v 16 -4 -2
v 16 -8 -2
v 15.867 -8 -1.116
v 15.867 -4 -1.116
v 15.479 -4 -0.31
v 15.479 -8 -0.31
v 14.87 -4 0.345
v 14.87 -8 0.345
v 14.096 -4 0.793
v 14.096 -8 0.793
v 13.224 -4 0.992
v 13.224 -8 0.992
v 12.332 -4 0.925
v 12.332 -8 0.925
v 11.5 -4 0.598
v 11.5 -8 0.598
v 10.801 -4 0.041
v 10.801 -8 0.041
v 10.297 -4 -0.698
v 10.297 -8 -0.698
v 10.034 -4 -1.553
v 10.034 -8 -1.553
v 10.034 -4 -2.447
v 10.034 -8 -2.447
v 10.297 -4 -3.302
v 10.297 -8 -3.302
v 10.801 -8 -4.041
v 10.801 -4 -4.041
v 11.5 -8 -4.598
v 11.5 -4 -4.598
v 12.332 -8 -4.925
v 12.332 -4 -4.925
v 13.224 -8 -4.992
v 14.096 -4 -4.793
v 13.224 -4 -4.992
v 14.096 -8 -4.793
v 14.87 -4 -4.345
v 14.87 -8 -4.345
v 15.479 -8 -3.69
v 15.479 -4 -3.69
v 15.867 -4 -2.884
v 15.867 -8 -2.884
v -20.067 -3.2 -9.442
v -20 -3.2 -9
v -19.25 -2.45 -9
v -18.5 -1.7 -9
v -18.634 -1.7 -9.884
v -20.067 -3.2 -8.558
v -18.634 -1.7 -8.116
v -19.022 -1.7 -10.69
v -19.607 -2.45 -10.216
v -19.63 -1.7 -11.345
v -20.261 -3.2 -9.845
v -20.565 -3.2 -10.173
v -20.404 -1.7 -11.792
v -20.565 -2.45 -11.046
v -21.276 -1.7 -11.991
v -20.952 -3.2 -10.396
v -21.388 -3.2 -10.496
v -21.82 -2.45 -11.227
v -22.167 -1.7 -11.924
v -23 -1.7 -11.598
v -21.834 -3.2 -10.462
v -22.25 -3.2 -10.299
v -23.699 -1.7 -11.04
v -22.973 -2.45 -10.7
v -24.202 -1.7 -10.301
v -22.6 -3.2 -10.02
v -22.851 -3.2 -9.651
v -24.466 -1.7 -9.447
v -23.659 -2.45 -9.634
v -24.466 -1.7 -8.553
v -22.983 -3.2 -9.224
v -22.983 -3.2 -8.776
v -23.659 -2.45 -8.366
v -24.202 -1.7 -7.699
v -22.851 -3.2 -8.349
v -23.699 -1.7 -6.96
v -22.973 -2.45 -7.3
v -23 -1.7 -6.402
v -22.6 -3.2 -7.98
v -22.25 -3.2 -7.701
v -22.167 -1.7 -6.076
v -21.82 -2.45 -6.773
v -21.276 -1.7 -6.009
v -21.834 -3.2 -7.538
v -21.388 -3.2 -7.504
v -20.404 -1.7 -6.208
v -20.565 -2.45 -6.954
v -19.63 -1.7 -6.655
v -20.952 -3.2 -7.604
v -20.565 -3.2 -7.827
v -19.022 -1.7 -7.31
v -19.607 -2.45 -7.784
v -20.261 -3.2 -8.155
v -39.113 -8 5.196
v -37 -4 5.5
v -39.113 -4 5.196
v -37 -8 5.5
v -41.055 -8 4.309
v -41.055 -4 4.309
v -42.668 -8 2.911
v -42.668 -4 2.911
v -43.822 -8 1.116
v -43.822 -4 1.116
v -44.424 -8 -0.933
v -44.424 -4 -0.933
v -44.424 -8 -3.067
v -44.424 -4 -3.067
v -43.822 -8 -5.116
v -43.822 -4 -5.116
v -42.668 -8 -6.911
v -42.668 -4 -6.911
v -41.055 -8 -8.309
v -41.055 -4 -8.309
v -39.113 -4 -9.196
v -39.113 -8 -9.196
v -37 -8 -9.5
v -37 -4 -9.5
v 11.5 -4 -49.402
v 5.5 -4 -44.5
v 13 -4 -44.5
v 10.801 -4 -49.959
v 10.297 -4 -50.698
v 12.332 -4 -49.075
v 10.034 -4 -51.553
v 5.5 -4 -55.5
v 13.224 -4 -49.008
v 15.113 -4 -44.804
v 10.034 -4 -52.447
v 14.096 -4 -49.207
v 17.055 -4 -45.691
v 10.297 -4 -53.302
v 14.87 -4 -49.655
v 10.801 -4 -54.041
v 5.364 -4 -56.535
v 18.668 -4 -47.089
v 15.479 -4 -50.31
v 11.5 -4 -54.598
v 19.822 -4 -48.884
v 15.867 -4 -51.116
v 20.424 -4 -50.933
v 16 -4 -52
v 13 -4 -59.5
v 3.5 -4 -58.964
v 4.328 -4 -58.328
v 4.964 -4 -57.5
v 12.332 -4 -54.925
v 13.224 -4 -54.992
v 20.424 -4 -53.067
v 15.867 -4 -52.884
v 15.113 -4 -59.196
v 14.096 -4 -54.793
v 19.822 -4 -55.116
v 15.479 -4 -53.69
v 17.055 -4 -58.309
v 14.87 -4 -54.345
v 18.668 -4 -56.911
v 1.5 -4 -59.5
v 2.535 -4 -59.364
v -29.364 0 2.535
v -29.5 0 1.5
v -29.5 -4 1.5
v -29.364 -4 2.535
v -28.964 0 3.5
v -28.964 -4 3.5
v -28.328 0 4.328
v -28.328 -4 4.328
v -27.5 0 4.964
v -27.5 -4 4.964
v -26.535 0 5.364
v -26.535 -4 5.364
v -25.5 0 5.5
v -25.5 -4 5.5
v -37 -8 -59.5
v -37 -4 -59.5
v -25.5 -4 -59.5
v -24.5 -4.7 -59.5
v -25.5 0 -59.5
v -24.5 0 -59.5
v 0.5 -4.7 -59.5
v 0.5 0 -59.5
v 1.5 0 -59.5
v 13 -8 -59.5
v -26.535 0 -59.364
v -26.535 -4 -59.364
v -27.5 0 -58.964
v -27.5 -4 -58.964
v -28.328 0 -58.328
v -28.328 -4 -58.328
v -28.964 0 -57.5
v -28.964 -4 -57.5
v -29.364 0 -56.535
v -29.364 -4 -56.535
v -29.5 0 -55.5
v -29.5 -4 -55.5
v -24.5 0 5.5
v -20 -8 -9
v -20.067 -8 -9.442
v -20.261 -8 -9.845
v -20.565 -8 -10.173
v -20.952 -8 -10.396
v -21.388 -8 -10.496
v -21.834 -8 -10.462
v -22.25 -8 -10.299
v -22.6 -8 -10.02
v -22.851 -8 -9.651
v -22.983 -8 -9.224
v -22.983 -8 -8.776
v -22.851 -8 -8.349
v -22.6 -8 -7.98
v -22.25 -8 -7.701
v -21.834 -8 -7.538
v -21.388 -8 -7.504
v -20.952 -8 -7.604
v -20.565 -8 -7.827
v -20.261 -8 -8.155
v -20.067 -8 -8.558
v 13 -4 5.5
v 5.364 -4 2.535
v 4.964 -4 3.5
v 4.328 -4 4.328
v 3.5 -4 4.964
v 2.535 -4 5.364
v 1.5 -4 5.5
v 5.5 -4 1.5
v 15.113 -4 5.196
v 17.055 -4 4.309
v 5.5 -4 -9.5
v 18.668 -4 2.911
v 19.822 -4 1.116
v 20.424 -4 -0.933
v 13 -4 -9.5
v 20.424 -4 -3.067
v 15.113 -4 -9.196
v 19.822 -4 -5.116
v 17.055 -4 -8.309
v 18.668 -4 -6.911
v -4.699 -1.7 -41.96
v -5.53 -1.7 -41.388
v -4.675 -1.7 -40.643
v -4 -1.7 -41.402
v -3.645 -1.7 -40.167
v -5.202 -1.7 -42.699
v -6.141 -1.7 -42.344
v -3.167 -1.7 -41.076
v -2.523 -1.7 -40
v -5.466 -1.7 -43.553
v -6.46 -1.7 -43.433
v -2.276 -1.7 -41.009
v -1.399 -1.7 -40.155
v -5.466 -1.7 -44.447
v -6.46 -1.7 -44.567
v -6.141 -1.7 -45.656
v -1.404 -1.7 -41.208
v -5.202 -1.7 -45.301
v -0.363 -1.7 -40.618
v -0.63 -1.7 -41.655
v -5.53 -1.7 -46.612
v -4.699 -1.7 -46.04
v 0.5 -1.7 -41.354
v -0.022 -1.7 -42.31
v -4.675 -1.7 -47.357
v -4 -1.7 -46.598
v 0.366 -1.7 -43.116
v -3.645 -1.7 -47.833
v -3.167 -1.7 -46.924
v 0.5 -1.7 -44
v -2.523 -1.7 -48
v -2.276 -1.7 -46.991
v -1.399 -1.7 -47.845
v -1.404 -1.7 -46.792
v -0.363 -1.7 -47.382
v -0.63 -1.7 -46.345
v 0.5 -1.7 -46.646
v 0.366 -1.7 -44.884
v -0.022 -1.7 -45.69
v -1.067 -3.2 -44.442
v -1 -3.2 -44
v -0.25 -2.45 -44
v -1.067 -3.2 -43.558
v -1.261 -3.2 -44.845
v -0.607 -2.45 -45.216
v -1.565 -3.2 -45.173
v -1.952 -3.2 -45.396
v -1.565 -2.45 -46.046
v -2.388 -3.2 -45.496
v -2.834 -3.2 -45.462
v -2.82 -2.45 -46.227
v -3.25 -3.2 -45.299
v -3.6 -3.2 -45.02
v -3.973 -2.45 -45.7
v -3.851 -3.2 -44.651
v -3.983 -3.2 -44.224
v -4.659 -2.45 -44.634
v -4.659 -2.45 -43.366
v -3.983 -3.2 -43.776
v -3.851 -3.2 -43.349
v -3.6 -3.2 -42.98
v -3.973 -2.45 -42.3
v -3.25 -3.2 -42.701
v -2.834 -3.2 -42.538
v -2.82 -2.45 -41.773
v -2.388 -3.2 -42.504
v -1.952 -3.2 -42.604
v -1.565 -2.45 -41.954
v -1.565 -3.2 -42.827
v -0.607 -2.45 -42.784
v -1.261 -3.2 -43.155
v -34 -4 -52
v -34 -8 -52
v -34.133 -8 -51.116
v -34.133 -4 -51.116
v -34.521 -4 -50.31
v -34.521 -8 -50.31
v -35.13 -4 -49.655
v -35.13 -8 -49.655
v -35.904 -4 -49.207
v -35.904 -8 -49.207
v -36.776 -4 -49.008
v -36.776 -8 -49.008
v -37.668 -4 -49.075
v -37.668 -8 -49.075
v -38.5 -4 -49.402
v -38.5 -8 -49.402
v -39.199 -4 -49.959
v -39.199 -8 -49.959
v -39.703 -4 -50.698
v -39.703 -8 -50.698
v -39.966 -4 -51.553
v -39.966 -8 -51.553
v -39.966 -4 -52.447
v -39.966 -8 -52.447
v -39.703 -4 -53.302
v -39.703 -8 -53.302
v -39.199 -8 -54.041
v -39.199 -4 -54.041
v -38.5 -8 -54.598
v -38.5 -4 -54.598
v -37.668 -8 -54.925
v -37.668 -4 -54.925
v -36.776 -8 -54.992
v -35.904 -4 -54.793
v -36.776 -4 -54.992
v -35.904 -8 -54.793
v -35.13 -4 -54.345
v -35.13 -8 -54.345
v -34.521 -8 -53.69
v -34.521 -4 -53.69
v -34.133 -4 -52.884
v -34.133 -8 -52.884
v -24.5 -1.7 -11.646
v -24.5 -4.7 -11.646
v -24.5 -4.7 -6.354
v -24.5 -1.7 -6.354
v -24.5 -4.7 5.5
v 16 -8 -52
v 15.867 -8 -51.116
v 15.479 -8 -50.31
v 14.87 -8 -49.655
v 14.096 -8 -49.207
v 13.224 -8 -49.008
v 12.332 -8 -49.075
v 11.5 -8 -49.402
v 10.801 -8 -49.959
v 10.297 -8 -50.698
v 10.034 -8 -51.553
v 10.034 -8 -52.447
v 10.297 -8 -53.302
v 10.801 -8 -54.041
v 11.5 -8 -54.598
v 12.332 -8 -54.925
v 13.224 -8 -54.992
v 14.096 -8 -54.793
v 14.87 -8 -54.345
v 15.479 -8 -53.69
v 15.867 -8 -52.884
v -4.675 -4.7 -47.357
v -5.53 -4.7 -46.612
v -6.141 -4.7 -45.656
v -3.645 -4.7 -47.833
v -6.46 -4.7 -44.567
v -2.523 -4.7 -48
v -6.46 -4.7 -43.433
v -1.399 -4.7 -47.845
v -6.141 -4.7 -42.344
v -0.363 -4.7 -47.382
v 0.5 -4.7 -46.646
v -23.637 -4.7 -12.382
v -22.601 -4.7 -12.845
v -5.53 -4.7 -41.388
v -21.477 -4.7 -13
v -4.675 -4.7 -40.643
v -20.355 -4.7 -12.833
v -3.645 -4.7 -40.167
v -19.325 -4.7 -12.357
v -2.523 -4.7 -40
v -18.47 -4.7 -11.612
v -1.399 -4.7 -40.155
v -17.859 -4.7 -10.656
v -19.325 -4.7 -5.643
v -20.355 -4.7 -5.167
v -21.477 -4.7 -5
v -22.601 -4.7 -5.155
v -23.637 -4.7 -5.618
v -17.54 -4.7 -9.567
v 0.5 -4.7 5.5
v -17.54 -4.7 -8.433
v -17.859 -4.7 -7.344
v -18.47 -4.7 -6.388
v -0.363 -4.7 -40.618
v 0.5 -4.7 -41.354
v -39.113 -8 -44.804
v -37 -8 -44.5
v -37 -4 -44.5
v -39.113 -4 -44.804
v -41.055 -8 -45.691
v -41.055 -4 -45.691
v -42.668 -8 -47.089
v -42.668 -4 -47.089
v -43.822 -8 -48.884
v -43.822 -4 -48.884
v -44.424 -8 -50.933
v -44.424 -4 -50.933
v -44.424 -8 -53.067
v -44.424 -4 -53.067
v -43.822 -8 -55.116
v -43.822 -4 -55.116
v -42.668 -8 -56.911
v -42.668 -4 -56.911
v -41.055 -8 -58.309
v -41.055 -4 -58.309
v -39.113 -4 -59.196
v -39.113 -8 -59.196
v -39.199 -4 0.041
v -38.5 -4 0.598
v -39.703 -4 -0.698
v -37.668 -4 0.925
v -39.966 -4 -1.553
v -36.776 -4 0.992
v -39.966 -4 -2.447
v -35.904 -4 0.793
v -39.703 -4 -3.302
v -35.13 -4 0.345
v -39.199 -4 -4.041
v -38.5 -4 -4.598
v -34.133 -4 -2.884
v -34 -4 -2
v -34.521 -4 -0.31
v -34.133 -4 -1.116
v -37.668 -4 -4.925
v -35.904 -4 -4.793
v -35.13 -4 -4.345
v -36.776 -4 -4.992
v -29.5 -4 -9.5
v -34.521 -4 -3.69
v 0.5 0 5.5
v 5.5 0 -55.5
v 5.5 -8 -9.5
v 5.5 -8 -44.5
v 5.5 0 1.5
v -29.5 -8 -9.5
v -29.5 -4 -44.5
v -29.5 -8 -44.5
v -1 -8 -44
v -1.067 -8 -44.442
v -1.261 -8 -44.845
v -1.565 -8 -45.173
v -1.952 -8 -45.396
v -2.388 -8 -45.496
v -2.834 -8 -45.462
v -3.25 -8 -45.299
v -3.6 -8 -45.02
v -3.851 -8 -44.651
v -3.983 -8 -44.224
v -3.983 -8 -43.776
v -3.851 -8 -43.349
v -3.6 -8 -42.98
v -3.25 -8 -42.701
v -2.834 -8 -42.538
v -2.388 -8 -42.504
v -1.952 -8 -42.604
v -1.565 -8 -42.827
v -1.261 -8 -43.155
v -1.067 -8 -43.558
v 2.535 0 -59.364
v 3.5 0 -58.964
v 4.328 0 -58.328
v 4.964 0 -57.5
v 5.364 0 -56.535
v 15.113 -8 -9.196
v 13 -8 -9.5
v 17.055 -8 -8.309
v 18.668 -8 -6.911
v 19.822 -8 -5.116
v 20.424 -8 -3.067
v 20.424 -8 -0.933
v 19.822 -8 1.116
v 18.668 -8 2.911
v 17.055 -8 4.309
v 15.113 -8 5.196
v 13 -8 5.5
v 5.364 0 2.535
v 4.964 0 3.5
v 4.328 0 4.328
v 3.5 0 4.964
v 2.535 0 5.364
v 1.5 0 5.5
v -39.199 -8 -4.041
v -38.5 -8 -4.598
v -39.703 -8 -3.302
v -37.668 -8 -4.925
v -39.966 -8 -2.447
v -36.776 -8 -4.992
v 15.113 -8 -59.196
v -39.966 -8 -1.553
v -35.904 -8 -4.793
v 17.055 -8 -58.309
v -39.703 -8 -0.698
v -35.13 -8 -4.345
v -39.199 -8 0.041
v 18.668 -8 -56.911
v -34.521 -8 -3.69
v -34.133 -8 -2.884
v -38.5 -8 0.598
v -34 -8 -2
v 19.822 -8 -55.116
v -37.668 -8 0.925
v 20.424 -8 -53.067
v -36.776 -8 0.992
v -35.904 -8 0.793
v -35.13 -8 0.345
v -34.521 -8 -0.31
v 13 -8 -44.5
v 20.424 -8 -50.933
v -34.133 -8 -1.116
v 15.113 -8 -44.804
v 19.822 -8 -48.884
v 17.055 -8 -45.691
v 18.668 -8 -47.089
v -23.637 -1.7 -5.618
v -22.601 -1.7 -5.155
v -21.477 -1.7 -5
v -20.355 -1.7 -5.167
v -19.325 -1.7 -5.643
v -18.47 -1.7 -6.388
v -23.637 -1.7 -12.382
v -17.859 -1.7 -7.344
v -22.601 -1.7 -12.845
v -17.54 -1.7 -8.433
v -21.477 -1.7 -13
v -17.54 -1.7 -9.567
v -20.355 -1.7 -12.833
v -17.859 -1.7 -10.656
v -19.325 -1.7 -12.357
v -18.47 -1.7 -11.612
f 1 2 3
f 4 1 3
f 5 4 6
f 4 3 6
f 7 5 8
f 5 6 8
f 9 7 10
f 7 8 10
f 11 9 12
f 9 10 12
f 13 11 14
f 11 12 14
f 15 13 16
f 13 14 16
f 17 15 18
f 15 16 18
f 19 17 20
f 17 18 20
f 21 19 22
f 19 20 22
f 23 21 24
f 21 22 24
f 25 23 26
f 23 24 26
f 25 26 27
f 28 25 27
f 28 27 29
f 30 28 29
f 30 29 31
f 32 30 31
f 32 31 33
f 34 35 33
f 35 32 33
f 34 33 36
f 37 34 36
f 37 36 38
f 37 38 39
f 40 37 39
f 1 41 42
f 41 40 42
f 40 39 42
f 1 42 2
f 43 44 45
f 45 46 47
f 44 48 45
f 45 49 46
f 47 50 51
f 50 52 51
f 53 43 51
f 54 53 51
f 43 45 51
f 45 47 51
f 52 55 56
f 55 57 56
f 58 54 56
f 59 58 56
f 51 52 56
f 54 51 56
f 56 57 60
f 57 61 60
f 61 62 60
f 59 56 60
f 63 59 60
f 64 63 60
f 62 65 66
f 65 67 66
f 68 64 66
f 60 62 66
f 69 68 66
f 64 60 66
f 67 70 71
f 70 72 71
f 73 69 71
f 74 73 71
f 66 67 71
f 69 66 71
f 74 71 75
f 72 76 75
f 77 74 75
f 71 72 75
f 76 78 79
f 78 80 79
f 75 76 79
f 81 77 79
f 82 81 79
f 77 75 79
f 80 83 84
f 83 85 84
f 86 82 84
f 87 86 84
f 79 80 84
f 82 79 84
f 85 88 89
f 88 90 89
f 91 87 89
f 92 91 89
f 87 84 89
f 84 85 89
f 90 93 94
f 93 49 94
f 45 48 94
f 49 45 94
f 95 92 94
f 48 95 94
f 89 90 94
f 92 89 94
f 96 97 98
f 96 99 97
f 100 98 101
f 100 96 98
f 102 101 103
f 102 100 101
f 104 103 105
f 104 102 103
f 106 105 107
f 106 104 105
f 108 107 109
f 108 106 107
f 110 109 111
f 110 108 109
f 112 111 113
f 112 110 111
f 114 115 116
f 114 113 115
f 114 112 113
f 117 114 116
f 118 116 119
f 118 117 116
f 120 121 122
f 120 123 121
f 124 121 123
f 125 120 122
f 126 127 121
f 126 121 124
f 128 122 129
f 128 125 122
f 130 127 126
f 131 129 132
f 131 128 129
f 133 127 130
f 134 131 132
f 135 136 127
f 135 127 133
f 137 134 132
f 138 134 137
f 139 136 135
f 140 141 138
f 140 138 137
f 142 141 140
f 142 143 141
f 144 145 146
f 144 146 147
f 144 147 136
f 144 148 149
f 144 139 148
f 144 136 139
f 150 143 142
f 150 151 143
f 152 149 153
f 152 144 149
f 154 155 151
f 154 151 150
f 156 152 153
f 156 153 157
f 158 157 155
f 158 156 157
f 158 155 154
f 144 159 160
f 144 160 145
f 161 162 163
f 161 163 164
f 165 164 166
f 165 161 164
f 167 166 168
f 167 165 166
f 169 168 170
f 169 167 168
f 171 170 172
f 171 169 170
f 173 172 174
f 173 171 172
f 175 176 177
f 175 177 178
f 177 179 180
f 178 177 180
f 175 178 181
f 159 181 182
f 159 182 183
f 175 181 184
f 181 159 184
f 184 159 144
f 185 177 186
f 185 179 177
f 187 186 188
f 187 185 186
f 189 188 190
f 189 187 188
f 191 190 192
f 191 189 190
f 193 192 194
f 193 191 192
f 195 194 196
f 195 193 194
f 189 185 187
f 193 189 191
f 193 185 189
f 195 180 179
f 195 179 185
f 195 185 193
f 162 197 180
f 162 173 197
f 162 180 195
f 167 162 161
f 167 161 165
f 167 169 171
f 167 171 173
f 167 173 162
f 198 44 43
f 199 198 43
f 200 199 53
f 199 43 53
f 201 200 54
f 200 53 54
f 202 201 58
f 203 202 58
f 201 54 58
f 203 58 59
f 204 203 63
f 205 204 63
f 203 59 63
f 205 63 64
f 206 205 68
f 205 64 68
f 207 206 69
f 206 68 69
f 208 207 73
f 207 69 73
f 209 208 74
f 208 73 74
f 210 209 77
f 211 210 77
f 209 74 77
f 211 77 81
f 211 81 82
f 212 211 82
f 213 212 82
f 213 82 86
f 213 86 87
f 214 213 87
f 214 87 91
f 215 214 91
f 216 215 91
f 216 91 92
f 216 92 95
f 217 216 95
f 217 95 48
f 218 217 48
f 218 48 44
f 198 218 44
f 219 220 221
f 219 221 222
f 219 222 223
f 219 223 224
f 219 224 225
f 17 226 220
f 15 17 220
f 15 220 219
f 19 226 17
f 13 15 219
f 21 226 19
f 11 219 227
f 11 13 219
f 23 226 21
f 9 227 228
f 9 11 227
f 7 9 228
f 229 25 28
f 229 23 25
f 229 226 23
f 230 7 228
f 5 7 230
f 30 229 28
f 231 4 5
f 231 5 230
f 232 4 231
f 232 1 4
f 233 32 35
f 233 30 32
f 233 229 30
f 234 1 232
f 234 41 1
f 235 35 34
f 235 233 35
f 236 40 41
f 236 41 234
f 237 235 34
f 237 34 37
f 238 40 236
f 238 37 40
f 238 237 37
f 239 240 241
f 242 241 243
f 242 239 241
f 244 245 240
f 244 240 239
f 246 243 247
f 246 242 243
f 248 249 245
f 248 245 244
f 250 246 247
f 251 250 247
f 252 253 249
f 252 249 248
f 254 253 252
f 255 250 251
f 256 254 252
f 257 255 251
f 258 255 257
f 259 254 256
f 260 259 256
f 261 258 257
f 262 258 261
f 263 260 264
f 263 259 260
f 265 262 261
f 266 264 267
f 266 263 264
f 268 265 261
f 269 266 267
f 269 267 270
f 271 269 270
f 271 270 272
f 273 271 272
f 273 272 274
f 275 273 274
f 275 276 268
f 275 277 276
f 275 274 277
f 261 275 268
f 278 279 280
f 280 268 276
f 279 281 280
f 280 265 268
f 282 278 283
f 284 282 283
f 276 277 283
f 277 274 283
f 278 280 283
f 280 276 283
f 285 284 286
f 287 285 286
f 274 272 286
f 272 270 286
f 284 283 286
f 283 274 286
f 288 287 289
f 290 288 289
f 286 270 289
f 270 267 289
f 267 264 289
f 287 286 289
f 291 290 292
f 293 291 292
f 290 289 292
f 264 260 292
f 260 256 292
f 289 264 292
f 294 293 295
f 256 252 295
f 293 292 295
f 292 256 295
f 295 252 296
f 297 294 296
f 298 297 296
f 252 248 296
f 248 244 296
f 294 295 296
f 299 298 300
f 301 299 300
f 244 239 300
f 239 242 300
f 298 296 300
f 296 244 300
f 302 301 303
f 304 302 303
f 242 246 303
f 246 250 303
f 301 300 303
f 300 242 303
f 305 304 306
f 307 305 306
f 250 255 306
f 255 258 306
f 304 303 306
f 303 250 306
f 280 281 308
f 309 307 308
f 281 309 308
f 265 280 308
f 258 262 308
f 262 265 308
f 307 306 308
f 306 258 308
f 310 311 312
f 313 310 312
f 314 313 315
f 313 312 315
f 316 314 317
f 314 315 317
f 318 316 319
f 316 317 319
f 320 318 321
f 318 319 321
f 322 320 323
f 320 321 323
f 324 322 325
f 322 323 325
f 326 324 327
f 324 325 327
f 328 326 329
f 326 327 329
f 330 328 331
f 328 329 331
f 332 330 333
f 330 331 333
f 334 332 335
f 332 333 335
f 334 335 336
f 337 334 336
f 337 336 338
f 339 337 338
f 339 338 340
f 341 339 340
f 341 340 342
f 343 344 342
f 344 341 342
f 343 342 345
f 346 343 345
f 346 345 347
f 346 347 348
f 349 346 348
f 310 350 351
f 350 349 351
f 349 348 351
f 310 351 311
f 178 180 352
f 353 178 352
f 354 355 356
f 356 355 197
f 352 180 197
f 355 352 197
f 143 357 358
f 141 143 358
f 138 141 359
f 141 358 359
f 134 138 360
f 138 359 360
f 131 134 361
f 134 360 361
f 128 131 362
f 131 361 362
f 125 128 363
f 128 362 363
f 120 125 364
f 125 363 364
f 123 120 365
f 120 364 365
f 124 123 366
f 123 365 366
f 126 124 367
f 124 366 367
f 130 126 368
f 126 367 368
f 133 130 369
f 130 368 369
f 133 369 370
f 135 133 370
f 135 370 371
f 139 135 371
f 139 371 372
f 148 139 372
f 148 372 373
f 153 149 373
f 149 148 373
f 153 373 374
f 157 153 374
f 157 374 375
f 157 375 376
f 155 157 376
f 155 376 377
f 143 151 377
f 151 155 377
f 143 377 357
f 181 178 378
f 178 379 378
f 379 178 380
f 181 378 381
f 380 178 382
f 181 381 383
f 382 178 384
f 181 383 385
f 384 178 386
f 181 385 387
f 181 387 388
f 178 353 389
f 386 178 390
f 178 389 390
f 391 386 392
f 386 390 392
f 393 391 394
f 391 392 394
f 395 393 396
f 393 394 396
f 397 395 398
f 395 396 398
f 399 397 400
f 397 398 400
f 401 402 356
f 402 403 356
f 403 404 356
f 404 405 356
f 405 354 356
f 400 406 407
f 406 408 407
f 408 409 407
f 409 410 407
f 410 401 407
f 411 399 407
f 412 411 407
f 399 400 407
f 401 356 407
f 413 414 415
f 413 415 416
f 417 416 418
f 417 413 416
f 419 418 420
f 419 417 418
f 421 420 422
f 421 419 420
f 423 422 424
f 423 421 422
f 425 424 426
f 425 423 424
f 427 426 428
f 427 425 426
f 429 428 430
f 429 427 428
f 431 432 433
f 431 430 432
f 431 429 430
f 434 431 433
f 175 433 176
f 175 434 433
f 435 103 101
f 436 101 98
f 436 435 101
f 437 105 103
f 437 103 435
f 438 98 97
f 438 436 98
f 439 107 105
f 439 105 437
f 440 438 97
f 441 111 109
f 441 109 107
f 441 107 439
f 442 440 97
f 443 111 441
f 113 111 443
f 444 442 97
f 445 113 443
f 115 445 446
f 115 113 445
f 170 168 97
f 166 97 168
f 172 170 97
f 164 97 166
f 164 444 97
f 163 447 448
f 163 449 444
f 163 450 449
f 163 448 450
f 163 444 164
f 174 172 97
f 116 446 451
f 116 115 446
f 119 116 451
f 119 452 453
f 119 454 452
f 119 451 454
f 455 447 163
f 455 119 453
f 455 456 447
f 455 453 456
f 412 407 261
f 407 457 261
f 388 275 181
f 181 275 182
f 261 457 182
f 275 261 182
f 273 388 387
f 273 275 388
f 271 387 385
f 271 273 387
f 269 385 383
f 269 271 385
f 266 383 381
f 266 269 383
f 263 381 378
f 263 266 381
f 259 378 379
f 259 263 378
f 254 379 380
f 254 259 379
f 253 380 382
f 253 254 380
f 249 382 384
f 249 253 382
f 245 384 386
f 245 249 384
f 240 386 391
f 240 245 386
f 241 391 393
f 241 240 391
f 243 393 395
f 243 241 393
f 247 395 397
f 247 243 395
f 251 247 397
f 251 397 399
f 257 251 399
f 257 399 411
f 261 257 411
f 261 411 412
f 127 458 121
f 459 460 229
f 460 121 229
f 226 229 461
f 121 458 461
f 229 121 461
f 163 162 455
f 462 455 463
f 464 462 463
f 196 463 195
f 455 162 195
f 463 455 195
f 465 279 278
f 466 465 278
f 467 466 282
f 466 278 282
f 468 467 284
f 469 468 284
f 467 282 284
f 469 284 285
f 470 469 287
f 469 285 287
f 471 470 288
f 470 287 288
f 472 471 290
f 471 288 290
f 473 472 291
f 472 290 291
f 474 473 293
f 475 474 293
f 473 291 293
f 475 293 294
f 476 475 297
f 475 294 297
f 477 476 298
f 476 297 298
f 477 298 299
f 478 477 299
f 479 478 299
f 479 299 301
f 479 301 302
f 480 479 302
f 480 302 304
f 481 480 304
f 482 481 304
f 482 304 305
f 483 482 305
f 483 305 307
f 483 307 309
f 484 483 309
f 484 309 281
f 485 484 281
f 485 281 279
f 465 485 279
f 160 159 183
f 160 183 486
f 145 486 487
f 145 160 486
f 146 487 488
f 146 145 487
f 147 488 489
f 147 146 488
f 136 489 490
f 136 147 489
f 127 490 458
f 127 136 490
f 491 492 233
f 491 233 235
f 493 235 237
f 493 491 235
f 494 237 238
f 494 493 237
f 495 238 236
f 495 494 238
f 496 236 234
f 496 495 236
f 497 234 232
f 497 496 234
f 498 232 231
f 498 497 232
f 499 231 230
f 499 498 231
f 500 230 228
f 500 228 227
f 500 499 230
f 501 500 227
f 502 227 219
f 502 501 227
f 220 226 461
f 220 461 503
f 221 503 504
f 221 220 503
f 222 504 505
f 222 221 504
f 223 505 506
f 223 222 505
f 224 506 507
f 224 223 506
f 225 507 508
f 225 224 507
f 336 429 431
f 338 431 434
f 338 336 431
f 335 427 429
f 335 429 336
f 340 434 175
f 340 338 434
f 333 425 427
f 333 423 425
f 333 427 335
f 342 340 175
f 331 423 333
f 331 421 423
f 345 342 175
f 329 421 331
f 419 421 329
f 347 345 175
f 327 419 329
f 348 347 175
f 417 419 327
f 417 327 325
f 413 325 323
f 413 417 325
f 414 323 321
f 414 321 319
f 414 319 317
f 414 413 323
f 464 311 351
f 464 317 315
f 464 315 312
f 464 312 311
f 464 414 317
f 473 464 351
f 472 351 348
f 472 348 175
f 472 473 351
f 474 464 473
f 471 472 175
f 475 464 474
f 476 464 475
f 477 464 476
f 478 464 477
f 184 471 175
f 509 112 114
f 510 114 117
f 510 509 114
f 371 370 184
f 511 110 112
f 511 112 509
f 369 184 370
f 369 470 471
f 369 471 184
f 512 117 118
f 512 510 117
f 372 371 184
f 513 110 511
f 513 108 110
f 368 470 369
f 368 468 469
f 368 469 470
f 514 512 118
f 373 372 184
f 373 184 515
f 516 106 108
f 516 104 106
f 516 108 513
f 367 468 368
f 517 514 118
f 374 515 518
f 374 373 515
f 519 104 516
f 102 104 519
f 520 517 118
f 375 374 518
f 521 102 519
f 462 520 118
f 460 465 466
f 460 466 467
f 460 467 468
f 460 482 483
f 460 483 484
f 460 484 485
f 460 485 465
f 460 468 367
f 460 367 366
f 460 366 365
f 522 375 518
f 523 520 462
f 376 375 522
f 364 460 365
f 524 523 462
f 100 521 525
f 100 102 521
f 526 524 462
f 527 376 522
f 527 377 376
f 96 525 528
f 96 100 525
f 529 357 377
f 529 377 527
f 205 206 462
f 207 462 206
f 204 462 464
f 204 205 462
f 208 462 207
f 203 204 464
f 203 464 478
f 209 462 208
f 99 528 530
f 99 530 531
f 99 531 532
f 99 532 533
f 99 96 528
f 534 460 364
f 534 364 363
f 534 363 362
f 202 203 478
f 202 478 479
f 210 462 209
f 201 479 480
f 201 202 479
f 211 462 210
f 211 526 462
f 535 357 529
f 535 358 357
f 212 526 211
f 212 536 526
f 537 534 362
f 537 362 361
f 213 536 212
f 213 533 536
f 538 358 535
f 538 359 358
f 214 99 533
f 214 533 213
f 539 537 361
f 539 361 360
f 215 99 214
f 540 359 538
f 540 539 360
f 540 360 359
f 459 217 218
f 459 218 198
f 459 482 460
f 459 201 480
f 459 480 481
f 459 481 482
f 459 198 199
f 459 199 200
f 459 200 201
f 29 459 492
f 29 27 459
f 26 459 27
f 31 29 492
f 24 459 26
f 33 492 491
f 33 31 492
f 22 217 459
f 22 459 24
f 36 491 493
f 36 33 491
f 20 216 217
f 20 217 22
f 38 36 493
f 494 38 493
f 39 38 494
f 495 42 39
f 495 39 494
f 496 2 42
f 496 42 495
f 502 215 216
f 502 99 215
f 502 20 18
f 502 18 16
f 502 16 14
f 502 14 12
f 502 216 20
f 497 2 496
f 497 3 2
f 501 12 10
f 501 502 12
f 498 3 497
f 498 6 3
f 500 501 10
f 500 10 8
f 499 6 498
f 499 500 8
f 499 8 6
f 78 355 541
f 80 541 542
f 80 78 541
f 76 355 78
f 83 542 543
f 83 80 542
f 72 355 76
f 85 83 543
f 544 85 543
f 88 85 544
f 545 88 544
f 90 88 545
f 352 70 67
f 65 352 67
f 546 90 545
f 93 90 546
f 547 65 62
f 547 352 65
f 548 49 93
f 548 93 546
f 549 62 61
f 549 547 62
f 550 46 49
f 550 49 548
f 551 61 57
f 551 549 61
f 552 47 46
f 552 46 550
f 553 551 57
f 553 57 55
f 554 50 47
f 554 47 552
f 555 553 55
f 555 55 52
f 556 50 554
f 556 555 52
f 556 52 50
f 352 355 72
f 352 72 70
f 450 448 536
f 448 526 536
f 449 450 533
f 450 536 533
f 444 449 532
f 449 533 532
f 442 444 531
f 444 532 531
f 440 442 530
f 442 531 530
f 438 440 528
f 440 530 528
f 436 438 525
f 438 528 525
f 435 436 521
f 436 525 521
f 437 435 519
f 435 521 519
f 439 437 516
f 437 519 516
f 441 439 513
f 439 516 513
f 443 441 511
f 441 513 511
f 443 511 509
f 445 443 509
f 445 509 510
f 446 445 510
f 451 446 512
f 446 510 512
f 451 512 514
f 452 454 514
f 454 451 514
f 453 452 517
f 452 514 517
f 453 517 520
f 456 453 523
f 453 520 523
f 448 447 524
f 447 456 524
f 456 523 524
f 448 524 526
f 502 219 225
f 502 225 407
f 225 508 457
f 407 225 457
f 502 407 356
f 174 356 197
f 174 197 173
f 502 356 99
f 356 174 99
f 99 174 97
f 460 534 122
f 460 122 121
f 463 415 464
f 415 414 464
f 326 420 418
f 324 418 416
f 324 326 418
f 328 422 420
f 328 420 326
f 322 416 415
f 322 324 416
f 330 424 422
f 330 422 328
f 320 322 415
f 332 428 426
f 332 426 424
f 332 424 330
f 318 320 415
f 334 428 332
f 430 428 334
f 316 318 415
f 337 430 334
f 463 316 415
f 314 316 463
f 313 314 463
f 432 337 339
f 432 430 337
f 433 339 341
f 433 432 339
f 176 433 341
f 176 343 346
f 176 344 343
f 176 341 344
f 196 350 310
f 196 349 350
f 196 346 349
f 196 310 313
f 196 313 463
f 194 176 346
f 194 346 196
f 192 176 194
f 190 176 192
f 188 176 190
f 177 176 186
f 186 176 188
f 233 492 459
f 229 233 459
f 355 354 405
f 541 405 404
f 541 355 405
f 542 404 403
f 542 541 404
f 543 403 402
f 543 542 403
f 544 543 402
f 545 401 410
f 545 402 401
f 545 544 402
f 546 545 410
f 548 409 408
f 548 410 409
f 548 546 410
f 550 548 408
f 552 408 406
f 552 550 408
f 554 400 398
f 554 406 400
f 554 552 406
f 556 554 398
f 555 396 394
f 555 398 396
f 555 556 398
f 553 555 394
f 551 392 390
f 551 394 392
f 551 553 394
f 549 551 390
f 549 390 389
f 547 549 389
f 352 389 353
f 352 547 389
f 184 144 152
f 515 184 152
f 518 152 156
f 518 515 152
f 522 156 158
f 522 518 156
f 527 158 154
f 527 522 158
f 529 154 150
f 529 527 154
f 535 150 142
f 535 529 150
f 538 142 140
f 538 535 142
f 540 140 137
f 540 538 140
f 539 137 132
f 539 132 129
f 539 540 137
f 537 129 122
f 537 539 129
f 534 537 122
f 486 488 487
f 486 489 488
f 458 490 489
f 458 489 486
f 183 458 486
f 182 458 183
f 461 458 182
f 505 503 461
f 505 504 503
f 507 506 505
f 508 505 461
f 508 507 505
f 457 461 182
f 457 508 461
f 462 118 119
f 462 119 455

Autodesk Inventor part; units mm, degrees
ref_plane "YZ Plane" through (0, 0, 0) normal (1, 0, 0) x (0, 1, 0)
sketch "Sketch1" plane through (0, 0, 0) normal (0, 1, 0) x (-1, 0, 0)
  line L0 (0, 0) -> (24, 0)
  line L1 (24, 0) -> (24, -54)
  line L2 (24, -54) -> (0, -54)
  line L3 (0, -54) -> (0, 0)
  circle A0 centre (21.5, -9) radius 1.5
  circle A1 centre (2.5, -44) radius 1.5
  line L4 (24.5, -54.5) -> (24.5, 0.5)
  line L5 (24.5, 0.5) -> (-0.5, 0.5)
  line L6 (-0.5, 0.5) -> (-0.5, -54.5)
  line L7 (-0.5, -54.5) -> (24.5, -54.5)
  line L8 (29.5, 5.5) -> (29.5, -59.5)
  line L9 (29.5, -59.5) -> (-5.5, -59.5)
  line L10 (-5.5, -59.5) -> (-5.5, 5.5)
  line L11 (-5.5, 5.5) -> (29.5, 5.5)
  dimension "d0" = 24
  dimension "d1" = 54
  dimension "d2" = 3
  dimension "d3" = 3
  dimension "d4" = 9
  dimension "d5" = 2.5
  dimension "d6" = 2.5
  dimension "d7" = 10
  dimension "d8" = 0.5
  dimension "d9" = 5
extrude "Extrusion1" add sketch "Sketch1" against normal blind 1.7 contours L8 L9 L10 L11
ref_plane "Work Plane1" through (0, -1.7, 0) normal (0, 1, 0) x (1, 0, 0)
sketch "Sketch2" plane through (0, -1.7, 0) normal (0, 1, 0) x (1, 0, 0)
  line L0 (0, 0) -> (-24, 0)
  line L1 (-24, 0) -> (-24, 54)
  line L2 (-24, 54) -> (0, 54)
  line L3 (0, 54) -> (0, 0)
  circle A0 centre (-21.5, 9) radius 1.5
  circle A1 centre (-2.5, 44) radius 1.5
  line L4 (-24.5, 54.5) -> (-24.5, -0.5)
  line L5 (-24.5, -0.5) -> (0.5, -0.5)
  line L6 (0.5, -0.5) -> (0.5, 54.5)
  line L7 (0.5, 54.5) -> (-24.5, 54.5)
  line L8 (-29.5, -5.5) -> (-29.5, 59.5)
  line L9 (-29.5, 59.5) -> (5.5, 59.5)
  line L10 (5.5, 59.5) -> (5.5, -5.5)
  line L11 (5.5, -5.5) -> (-29.5, -5.5)
  circle A2 centre (-21.5, 9) radius 4
  circle A3 centre (-2.5, 44) radius 4
  point P0 (-24.5, 6.3542)
  point P1 (-24.5, 11.6458)
  point P2 (0.5, 46.6458)
  point P3 (0.5, 41.3542)
  dimension "d13" = 24
  dimension "d14" = 54
  dimension "d15" = 3
  dimension "d16" = 3
  dimension "d17" = 9
  dimension "d18" = 2.5
  dimension "d19" = 2.5
  dimension "d20" = 10
  dimension "d21" = 0.5
  dimension "d22" = 5
  dimension "d23" = 8
  dimension "d24" = 8
extrude "Extrusion2" add sketch "Sketch2" against normal blind 3 contours A3 L3 | L3 A3 L6 | A2 L4 L1 | L1 A2 | L6 A3 | A2 L4 | L8 L9 L10 L11
sketch "Sketch3" plane through (0, -4.7, 0) normal (0, -1, 0) x (1, 0, 0)
  line L0 (5.5, -59.5) -> (5.5, 5.5) projected
  line L1 (5.5, 5.5) -> (-29.5, 5.5) projected
  line L2 (-29.5, 5.5) -> (-29.5, -59.5) projected
  line L3 (-29.5, -59.5) -> (5.5, -59.5) projected
  point P0 (0, 0)
extrude "Extrusion3" add sketch "Sketch3" along normal blind 3.3
ref_plane "Work Plane2" through (0, -8, 0) normal (0, 1, 0) x (1, 0, 0)
sketch "Sketch4" plane through (0, -8, 0) normal (0, 1, 0) x (1, 0, 0)
  line L0 (-37, 2) -> (13, 2) construction
  line L1 (13, 2) -> (13, 52) construction
  line L2 (13, 52) -> (-37, 52) construction
  line L3 (-37, 52) -> (-37, 2) construction
  line L4 (0.5, -0.5) -> (-24.5, -0.5) construction
  line L5 (-12, -0.5) -> (-12, 54.5) construction
  line L6 (-24.5, 54.5) -> (0.5, 54.5) construction
  line L7 (-29.5, 59.5) -> (-29.5, -5.5) projected
  line L8 (-29.5, 27) -> (5.5, 27) construction
  line L9 (5.5, -5.5) -> (5.5, 59.5) projected
  circle A0 centre (-37, 2) radius 3
  circle A1 centre (-37, 52) radius 3
  circle A2 centre (13, 52) radius 3
  circle A3 centre (13, 2) radius 3
  circle A4 centre (-37, 2) radius 7.5
  line L10 (-29.5, -5.5) -> (5.5, -5.5) projected
  circle A5 centre (-37, 52) radius 7.5
  circle A6 centre (13, 52) radius 7.5
  circle A7 centre (13, 2) radius 7.5
  line L11 (5.5, 59.5) -> (-29.5, 59.5) projected
  line L12 (5.5, -5.5) -> (13, -5.5)
  line L13 (5.5, 59.5) -> (13, 59.5)
  line L14 (13, 44.5) -> (5.5, 44.5)
  line L15 (13, 9.5) -> (5.5, 9.5)
  line L16 (-29.5, -5.5) -> (-37, -5.5)
  line L17 (-37, 9.5) -> (-29.5, 9.5)
  line L18 (-37, 44.5) -> (-29.5, 44.5)
  line L19 (-37, 59.5) -> (-29.5, 59.5)
  point P0 (0, 0)
  dimension "d30" = 50
  dimension "d31" = 50
  dimension "d32" = 25
  dimension "d33" = 25
  dimension "d34" = 6
  dimension "d35" = 6
  dimension "d36" = 6
  dimension "d37" = 6
extrude "Extrusion4" add sketch "Sketch4" along normal blind 4 contours L7 A5 L19 | A5 | L7 L18 A5 | L13 A6 L9 | A6 L14 L9 | A6 | L7 A4 L17 | A4 | L7 L16 A4 | L15 A7 L9 | A7 L12 L9 | A7
fillet "Fillet1" radius 4 6 edges at (5.5, -2.85, -59.5) (5.5, -0.85, -59.5) (-29.5, -2, -59.5) (-29.5, -2, 5.5) (5.5, -0.85, 5.5) (5.5, -2.85, 5.5)
chamfer "Chamfer1" distance 1.5 angle 45 2 edges at (-4, -1.7, -44) (-23, -1.7, -9)
sketch "Sketch5" plane through (-2.5, -4.7, -44) normal (0, 1, 0) x (1, 0, 0)
  circle A0 centre (-19, -35) radius 1.5 projected
  circle A1 centre (0, 0) radius 1.5 projected
  point P0 (2.5, -44)
extrude "Extrusion5" cut sketch "Sketch5" against normal through all
sketch "Sketch6" plane through (0, 0, 0) normal (0, 1, 0) x (1, 0, 0)
  line L0 (-24.5, 54.5) -> (0.5, 54.5) projected
  line L1 (0.5, 54.5) -> (0.5, 59.563)
  line L2 (1.5, 59.5) -> (-25.5, 59.5) projected
  line L3 (-24.5, 54.5) -> (-24.5, 59.5)
  line L4 (0.5, -0.5) -> (-24.5, -0.5) projected
  line L5 (0.5, -0.5) -> (0.5, -5.5)
  line L6 (-25.5, -5.5) -> (1.5, -5.5) projected
  line L7 (-24.5, -0.5) -> (-24.5, -5.5)
  point P0 (0, 0)
  point P1 (0.5, 59.5)
extrude "Extrusion6" cut sketch "Sketch6" against normal up to surface (4.7 mm away)
equation "\"d3\" = d2"
equation "\"d6\" = d5"
equation "\"d16\" = d15"
equation "\"d19\" = d18"
equation "\"d24\" = d23"
equation "\"d32\" = 0.5 * d30"
equation "\"d33\" = 0.5 * d31"
equation "\"d35\" = d34"
equation "\"d36\" = d34"
equation "\"d37\" = d34"
properties part number "DCDC Converter Mount"
